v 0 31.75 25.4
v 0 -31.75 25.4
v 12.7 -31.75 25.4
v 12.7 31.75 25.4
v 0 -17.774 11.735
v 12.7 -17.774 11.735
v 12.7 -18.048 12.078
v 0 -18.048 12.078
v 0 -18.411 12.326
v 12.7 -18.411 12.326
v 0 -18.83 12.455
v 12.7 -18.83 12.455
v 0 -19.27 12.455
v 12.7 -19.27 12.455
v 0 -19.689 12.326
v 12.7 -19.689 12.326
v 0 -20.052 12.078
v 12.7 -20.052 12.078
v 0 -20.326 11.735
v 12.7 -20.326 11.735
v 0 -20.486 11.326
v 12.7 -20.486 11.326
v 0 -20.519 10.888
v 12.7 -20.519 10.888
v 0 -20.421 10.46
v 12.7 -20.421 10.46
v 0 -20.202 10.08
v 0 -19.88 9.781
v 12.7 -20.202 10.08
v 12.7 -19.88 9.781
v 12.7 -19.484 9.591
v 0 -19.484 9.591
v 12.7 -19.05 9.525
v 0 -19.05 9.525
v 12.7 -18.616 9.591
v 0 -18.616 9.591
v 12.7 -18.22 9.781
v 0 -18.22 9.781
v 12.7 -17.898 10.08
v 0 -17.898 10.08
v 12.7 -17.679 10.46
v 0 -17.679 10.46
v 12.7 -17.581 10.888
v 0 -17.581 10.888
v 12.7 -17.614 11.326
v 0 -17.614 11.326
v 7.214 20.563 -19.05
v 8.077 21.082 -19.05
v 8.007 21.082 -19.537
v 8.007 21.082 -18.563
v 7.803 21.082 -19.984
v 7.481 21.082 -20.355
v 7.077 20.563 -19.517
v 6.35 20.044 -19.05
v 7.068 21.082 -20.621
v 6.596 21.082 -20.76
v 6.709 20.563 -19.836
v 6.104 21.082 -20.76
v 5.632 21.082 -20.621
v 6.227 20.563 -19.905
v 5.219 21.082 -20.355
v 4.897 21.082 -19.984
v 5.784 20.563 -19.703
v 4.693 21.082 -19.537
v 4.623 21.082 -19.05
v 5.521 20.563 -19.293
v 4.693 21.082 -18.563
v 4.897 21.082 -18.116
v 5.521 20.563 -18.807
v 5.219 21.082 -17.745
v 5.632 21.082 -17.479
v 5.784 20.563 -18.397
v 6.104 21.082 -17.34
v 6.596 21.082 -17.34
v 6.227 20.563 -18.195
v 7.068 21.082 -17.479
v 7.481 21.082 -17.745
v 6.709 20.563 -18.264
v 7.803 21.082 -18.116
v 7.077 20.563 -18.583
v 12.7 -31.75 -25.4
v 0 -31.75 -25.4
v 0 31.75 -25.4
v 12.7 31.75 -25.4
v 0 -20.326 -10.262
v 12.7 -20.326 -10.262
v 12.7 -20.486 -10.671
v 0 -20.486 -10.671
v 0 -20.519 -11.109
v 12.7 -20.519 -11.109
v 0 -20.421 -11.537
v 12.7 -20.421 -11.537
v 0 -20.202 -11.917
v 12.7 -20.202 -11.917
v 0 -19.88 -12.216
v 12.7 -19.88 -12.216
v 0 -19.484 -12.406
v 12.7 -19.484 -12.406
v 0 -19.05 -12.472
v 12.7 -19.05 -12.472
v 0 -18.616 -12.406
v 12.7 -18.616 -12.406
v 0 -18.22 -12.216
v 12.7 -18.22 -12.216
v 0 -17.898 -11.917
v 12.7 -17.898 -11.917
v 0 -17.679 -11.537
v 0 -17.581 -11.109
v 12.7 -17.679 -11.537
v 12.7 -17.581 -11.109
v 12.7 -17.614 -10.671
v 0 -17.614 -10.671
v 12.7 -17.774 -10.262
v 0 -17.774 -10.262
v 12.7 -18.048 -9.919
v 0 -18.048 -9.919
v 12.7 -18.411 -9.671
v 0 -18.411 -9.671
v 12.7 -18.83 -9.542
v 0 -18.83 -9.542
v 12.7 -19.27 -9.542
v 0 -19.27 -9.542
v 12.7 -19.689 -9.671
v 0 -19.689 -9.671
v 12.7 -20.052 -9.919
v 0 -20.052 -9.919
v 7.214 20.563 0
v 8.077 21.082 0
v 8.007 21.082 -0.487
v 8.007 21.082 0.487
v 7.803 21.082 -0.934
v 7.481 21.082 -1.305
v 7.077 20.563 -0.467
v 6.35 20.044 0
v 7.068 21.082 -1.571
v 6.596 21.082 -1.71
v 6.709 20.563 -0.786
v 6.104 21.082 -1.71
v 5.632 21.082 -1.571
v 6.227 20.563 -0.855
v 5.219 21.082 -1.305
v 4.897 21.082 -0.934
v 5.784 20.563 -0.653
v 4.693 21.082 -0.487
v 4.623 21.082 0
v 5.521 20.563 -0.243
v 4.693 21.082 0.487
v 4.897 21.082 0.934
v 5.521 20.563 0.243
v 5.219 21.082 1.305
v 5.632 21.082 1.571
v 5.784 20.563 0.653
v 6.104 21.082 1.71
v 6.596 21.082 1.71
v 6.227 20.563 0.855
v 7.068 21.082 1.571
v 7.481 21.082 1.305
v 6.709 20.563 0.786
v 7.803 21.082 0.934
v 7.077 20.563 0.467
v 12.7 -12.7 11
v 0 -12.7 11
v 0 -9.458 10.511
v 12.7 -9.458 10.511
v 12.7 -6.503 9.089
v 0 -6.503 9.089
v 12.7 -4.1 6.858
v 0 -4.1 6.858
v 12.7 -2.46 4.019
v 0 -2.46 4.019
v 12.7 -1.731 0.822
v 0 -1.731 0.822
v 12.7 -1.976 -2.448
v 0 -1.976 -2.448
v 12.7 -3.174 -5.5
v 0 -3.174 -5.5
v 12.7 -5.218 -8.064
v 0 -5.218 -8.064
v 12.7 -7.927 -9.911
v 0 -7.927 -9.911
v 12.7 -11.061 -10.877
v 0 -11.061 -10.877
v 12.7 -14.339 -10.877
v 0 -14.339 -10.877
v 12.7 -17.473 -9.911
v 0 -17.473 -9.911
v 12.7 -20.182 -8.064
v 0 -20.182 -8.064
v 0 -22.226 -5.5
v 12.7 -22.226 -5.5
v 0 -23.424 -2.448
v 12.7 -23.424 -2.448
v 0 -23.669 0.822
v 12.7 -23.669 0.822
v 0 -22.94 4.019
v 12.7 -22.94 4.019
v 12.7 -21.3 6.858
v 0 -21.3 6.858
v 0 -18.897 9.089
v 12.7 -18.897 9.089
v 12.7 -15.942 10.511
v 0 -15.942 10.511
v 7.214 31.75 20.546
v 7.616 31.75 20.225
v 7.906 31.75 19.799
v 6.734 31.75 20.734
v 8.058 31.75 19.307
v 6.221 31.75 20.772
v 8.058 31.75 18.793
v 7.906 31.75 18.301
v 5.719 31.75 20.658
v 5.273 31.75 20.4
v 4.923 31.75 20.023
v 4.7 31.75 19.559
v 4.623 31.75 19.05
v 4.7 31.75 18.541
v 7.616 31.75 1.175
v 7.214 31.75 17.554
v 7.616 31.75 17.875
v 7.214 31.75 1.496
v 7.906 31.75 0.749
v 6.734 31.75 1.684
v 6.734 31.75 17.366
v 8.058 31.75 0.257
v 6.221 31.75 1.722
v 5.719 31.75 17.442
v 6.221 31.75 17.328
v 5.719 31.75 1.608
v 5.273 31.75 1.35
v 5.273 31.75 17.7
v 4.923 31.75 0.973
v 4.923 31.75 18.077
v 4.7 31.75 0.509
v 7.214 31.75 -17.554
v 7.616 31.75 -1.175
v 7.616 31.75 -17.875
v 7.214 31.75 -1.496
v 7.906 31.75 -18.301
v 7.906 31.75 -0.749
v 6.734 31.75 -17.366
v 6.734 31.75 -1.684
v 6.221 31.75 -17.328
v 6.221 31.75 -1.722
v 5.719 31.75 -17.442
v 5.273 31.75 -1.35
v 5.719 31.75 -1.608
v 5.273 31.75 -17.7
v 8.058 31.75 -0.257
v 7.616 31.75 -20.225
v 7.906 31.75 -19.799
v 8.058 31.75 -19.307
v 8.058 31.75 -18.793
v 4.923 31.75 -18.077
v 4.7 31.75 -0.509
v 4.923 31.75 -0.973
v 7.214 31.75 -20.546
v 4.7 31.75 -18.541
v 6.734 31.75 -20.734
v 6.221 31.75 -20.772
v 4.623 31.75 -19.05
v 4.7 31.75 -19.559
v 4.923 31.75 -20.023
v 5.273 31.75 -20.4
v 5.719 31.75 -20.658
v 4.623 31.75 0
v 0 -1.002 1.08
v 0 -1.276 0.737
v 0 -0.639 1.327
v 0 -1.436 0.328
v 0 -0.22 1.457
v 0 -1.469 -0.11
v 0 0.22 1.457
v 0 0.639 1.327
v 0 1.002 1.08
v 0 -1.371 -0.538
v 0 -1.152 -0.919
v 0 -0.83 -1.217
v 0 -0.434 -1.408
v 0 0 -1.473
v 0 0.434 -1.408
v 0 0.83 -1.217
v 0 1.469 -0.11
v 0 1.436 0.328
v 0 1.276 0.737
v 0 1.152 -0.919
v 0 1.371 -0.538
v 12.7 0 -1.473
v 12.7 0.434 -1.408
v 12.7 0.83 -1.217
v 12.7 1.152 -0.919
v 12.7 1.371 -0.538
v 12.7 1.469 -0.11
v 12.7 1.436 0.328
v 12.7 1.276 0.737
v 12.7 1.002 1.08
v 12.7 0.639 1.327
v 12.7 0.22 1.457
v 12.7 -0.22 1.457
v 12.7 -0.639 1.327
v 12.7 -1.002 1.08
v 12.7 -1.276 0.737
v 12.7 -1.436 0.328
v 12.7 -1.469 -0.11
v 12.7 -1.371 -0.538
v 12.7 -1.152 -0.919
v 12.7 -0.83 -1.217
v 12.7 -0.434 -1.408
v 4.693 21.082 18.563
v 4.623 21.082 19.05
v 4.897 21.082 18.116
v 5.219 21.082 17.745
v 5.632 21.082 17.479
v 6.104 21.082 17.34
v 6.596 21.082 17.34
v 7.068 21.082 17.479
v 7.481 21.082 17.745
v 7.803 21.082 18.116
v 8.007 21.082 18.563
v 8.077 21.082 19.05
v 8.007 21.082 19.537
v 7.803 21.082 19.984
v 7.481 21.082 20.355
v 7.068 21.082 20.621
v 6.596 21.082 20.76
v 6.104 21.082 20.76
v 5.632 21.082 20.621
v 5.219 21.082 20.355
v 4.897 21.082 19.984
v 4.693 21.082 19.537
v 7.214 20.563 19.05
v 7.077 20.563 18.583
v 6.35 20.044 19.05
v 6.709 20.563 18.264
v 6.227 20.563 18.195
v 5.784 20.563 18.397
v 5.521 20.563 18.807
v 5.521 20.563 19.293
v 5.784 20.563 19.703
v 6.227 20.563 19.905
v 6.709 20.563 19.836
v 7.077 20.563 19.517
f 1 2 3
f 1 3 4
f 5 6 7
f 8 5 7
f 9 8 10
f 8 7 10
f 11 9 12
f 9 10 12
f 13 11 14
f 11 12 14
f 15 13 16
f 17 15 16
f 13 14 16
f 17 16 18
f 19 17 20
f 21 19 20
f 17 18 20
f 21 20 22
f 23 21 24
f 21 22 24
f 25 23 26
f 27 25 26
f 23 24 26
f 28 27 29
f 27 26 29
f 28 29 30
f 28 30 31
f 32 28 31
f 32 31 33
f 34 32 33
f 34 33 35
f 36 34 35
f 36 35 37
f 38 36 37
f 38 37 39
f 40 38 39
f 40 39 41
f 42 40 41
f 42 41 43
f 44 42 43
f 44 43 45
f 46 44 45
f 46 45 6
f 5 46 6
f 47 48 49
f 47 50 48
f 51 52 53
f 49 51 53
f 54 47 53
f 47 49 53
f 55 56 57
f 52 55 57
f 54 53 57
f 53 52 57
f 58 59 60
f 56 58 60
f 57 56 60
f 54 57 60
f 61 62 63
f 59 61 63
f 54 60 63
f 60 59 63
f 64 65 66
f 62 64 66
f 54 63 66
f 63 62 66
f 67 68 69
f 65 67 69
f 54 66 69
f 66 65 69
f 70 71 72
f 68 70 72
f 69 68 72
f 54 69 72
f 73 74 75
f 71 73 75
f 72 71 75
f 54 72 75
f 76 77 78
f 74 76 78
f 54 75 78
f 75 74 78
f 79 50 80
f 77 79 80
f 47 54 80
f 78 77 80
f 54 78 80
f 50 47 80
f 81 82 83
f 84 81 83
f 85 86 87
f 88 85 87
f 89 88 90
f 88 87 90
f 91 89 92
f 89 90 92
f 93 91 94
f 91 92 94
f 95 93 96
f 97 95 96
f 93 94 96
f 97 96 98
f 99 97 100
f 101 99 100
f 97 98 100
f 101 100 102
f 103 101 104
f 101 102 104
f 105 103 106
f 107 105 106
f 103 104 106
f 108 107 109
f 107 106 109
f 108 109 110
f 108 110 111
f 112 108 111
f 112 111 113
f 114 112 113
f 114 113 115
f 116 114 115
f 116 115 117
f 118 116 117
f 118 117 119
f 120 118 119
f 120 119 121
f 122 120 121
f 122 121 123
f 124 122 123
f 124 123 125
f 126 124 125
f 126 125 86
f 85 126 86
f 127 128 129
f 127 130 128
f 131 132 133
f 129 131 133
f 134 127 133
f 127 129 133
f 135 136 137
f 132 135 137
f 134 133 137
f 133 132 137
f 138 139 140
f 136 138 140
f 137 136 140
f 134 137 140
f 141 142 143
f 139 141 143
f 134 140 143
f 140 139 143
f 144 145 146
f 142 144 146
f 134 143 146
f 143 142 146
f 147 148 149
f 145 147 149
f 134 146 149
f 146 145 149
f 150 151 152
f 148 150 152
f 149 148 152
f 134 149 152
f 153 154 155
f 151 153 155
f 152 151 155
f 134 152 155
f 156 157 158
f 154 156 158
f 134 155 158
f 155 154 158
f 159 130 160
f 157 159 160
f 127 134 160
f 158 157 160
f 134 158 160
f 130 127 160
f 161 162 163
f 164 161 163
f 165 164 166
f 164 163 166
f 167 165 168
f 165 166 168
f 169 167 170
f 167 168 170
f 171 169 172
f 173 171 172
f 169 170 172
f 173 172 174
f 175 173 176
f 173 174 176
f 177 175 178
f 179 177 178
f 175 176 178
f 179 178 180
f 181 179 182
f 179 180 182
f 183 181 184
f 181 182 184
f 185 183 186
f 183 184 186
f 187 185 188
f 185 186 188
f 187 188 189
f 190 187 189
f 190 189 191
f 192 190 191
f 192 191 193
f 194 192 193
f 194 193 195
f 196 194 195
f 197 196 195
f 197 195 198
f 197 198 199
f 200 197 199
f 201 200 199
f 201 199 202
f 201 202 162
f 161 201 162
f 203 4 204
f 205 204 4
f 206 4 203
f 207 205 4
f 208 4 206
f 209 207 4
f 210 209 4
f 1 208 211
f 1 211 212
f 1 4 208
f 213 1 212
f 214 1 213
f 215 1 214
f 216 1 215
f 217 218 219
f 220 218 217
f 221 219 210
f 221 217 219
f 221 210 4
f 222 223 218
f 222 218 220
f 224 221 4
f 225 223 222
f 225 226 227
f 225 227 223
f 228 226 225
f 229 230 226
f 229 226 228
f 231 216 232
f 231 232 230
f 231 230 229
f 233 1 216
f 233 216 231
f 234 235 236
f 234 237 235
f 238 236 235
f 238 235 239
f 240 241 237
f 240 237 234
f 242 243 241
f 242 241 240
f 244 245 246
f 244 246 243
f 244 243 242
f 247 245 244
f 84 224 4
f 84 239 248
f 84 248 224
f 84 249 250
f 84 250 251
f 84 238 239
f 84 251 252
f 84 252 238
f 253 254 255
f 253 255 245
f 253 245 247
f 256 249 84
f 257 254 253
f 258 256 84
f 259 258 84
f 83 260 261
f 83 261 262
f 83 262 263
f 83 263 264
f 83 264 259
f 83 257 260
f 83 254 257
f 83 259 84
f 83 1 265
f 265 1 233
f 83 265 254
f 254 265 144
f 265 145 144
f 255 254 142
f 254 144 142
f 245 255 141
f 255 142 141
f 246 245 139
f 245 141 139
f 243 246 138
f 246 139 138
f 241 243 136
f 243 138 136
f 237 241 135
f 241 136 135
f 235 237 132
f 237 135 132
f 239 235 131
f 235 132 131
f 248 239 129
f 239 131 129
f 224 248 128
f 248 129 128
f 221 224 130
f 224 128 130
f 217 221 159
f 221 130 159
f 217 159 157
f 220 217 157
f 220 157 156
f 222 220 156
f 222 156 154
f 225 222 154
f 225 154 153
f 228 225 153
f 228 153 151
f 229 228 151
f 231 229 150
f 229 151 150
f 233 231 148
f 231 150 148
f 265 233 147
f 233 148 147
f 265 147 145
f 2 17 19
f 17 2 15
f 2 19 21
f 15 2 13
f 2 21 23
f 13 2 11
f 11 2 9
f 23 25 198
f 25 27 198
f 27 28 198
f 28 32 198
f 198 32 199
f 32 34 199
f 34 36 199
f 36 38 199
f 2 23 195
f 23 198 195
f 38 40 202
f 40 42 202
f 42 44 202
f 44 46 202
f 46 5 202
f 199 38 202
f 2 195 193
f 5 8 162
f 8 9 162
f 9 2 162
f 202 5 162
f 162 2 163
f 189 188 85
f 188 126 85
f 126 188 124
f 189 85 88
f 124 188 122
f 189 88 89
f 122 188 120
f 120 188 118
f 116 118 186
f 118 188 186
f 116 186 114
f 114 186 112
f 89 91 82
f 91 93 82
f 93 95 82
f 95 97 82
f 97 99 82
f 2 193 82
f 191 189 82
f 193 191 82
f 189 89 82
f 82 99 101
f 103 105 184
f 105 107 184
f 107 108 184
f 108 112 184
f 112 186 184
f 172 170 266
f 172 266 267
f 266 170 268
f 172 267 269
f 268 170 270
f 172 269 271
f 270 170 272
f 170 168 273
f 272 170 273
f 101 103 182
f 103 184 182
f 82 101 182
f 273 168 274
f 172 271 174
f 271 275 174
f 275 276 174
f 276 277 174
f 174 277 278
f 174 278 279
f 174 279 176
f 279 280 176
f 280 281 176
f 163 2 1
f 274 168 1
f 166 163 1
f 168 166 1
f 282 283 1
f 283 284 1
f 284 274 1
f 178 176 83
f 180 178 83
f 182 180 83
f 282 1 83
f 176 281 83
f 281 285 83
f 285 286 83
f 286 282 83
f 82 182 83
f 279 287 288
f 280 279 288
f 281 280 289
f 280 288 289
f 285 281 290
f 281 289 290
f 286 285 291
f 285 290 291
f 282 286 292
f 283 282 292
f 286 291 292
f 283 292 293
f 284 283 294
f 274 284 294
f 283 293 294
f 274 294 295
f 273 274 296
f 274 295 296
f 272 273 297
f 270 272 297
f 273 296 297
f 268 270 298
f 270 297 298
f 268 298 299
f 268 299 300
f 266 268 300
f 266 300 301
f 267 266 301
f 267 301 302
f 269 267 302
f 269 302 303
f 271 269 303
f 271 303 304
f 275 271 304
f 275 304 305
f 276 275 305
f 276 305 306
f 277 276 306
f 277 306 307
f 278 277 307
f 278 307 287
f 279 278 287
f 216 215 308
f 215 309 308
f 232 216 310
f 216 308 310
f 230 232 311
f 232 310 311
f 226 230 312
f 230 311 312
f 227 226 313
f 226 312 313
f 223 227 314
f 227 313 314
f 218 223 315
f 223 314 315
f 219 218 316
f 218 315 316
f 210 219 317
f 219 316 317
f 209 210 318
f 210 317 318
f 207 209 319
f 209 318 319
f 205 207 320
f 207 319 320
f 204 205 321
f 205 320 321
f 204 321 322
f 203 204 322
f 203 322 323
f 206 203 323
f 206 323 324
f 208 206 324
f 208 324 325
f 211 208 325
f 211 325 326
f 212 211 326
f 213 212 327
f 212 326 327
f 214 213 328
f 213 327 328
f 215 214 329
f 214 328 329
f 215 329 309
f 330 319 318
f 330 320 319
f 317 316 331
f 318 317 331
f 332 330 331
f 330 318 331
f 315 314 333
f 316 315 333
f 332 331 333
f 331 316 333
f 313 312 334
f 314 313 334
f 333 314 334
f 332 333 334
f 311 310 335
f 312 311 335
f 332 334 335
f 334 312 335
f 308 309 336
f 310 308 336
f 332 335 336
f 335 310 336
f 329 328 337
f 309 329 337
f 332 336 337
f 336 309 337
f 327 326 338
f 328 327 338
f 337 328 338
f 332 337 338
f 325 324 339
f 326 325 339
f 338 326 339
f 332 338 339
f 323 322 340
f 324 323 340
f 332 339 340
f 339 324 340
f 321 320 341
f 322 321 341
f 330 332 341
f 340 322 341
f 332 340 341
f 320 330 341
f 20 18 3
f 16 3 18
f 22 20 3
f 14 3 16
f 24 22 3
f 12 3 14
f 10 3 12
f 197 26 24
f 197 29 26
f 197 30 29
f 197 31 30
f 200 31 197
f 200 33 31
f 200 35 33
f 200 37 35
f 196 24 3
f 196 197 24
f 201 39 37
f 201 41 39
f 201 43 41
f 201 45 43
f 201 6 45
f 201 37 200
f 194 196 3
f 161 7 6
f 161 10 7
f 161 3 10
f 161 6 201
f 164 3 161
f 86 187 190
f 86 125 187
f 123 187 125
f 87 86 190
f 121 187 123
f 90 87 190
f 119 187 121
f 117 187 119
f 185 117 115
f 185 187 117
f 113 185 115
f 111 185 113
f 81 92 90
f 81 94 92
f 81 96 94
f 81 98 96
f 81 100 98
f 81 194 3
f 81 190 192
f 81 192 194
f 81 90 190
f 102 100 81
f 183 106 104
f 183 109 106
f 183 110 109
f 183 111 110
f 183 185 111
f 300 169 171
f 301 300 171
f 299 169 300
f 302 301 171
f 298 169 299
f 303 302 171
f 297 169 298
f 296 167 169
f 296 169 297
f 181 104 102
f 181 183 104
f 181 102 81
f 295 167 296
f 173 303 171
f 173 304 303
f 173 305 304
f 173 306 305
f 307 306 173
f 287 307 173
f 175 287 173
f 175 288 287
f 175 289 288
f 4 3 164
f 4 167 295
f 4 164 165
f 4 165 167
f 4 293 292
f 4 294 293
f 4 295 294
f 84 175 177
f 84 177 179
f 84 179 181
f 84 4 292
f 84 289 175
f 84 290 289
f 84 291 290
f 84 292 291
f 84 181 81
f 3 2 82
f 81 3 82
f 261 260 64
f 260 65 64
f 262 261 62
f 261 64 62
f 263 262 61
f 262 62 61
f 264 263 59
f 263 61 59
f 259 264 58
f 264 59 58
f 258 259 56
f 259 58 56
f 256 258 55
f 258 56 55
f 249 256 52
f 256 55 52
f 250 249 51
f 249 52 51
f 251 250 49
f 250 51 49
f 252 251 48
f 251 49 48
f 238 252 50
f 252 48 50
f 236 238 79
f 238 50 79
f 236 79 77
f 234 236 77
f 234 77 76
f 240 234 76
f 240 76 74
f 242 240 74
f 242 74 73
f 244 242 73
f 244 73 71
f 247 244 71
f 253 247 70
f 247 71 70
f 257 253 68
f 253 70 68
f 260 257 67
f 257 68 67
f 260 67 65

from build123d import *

# Parameters (mm, degrees)
SKETCH1_W                  = 50.8
SKETCH1_H                  = 63.5
BOSS_EXTRUDE1_DEPTH        = 12.7
F_22_0_22_DIAMETER_HOLE1_D = 22
F_8_32_TAPPED_HOLE1_D      = 3.4544
F_8_32_TAPPED_HOLE1_DEPTH  = 10.668
F_8_32_TAPPED_HOLE1_TIP    = 1.037806461
F_4_CLEARANCE_HOLE1_D      = 2.9464
CIRPATTERN1_COUNT          = 3


with BuildPart() as part:
    # Sketch1 → Boss-Extrude1 (new body)
    with BuildSketch(Plane(origin=(0, 0, 0), x_dir=(0, 0, -1), z_dir=(1, 0, 0))):
        Rectangle(SKETCH1_W, SKETCH1_H)
    extrude(amount=BOSS_EXTRUDE1_DEPTH)

    # Ø22.0 (22) Diameter Hole1 (through all)
    with Locations(Plane(origin=(12.7, 0, 0), x_dir=(0, 0, -1), z_dir=(1, 0, 0))):
        with Locations((0, -12.7)):
            Hole(F_22_0_22_DIAMETER_HOLE1_D / 2)

    # #8-32 Tapped Hole1
    with Locations(Plane(origin=(0, 31.75, 0), x_dir=(1, 0, 0), z_dir=(0, 1, 0))):
        with Locations((6.35, 19.05), (6.35, -19.05), (6.35, 0)):
            Hole(F_8_32_TAPPED_HOLE1_D / 2, depth=F_8_32_TAPPED_HOLE1_DEPTH)
            with Locations((0, 0, -(F_8_32_TAPPED_HOLE1_DEPTH + F_8_32_TAPPED_HOLE1_TIP / 2))):  # 118° drill point
                Cone(0, F_8_32_TAPPED_HOLE1_D / 2, F_8_32_TAPPED_HOLE1_TIP, mode=Mode.SUBTRACT)

    # #4 Clearance Hole1 (through all)
    with Locations(Plane.ZY):
        with Locations((0, 0)):
            f_4_clearance_hole1 = Hole(F_4_CLEARANCE_HOLE1_D / 2)

    # CirPattern1: #4 Clearance Hole1 ×3 about axis
    cirpattern1_axis = Axis((0, -12.7, 0), (1, 0, 0))
    for i in range(1, CIRPATTERN1_COUNT):
        add(f_4_clearance_hole1.rotate(cirpattern1_axis, i * 360 / CIRPATTERN1_COUNT), mode=Mode.SUBTRACT)


solid = part.part
